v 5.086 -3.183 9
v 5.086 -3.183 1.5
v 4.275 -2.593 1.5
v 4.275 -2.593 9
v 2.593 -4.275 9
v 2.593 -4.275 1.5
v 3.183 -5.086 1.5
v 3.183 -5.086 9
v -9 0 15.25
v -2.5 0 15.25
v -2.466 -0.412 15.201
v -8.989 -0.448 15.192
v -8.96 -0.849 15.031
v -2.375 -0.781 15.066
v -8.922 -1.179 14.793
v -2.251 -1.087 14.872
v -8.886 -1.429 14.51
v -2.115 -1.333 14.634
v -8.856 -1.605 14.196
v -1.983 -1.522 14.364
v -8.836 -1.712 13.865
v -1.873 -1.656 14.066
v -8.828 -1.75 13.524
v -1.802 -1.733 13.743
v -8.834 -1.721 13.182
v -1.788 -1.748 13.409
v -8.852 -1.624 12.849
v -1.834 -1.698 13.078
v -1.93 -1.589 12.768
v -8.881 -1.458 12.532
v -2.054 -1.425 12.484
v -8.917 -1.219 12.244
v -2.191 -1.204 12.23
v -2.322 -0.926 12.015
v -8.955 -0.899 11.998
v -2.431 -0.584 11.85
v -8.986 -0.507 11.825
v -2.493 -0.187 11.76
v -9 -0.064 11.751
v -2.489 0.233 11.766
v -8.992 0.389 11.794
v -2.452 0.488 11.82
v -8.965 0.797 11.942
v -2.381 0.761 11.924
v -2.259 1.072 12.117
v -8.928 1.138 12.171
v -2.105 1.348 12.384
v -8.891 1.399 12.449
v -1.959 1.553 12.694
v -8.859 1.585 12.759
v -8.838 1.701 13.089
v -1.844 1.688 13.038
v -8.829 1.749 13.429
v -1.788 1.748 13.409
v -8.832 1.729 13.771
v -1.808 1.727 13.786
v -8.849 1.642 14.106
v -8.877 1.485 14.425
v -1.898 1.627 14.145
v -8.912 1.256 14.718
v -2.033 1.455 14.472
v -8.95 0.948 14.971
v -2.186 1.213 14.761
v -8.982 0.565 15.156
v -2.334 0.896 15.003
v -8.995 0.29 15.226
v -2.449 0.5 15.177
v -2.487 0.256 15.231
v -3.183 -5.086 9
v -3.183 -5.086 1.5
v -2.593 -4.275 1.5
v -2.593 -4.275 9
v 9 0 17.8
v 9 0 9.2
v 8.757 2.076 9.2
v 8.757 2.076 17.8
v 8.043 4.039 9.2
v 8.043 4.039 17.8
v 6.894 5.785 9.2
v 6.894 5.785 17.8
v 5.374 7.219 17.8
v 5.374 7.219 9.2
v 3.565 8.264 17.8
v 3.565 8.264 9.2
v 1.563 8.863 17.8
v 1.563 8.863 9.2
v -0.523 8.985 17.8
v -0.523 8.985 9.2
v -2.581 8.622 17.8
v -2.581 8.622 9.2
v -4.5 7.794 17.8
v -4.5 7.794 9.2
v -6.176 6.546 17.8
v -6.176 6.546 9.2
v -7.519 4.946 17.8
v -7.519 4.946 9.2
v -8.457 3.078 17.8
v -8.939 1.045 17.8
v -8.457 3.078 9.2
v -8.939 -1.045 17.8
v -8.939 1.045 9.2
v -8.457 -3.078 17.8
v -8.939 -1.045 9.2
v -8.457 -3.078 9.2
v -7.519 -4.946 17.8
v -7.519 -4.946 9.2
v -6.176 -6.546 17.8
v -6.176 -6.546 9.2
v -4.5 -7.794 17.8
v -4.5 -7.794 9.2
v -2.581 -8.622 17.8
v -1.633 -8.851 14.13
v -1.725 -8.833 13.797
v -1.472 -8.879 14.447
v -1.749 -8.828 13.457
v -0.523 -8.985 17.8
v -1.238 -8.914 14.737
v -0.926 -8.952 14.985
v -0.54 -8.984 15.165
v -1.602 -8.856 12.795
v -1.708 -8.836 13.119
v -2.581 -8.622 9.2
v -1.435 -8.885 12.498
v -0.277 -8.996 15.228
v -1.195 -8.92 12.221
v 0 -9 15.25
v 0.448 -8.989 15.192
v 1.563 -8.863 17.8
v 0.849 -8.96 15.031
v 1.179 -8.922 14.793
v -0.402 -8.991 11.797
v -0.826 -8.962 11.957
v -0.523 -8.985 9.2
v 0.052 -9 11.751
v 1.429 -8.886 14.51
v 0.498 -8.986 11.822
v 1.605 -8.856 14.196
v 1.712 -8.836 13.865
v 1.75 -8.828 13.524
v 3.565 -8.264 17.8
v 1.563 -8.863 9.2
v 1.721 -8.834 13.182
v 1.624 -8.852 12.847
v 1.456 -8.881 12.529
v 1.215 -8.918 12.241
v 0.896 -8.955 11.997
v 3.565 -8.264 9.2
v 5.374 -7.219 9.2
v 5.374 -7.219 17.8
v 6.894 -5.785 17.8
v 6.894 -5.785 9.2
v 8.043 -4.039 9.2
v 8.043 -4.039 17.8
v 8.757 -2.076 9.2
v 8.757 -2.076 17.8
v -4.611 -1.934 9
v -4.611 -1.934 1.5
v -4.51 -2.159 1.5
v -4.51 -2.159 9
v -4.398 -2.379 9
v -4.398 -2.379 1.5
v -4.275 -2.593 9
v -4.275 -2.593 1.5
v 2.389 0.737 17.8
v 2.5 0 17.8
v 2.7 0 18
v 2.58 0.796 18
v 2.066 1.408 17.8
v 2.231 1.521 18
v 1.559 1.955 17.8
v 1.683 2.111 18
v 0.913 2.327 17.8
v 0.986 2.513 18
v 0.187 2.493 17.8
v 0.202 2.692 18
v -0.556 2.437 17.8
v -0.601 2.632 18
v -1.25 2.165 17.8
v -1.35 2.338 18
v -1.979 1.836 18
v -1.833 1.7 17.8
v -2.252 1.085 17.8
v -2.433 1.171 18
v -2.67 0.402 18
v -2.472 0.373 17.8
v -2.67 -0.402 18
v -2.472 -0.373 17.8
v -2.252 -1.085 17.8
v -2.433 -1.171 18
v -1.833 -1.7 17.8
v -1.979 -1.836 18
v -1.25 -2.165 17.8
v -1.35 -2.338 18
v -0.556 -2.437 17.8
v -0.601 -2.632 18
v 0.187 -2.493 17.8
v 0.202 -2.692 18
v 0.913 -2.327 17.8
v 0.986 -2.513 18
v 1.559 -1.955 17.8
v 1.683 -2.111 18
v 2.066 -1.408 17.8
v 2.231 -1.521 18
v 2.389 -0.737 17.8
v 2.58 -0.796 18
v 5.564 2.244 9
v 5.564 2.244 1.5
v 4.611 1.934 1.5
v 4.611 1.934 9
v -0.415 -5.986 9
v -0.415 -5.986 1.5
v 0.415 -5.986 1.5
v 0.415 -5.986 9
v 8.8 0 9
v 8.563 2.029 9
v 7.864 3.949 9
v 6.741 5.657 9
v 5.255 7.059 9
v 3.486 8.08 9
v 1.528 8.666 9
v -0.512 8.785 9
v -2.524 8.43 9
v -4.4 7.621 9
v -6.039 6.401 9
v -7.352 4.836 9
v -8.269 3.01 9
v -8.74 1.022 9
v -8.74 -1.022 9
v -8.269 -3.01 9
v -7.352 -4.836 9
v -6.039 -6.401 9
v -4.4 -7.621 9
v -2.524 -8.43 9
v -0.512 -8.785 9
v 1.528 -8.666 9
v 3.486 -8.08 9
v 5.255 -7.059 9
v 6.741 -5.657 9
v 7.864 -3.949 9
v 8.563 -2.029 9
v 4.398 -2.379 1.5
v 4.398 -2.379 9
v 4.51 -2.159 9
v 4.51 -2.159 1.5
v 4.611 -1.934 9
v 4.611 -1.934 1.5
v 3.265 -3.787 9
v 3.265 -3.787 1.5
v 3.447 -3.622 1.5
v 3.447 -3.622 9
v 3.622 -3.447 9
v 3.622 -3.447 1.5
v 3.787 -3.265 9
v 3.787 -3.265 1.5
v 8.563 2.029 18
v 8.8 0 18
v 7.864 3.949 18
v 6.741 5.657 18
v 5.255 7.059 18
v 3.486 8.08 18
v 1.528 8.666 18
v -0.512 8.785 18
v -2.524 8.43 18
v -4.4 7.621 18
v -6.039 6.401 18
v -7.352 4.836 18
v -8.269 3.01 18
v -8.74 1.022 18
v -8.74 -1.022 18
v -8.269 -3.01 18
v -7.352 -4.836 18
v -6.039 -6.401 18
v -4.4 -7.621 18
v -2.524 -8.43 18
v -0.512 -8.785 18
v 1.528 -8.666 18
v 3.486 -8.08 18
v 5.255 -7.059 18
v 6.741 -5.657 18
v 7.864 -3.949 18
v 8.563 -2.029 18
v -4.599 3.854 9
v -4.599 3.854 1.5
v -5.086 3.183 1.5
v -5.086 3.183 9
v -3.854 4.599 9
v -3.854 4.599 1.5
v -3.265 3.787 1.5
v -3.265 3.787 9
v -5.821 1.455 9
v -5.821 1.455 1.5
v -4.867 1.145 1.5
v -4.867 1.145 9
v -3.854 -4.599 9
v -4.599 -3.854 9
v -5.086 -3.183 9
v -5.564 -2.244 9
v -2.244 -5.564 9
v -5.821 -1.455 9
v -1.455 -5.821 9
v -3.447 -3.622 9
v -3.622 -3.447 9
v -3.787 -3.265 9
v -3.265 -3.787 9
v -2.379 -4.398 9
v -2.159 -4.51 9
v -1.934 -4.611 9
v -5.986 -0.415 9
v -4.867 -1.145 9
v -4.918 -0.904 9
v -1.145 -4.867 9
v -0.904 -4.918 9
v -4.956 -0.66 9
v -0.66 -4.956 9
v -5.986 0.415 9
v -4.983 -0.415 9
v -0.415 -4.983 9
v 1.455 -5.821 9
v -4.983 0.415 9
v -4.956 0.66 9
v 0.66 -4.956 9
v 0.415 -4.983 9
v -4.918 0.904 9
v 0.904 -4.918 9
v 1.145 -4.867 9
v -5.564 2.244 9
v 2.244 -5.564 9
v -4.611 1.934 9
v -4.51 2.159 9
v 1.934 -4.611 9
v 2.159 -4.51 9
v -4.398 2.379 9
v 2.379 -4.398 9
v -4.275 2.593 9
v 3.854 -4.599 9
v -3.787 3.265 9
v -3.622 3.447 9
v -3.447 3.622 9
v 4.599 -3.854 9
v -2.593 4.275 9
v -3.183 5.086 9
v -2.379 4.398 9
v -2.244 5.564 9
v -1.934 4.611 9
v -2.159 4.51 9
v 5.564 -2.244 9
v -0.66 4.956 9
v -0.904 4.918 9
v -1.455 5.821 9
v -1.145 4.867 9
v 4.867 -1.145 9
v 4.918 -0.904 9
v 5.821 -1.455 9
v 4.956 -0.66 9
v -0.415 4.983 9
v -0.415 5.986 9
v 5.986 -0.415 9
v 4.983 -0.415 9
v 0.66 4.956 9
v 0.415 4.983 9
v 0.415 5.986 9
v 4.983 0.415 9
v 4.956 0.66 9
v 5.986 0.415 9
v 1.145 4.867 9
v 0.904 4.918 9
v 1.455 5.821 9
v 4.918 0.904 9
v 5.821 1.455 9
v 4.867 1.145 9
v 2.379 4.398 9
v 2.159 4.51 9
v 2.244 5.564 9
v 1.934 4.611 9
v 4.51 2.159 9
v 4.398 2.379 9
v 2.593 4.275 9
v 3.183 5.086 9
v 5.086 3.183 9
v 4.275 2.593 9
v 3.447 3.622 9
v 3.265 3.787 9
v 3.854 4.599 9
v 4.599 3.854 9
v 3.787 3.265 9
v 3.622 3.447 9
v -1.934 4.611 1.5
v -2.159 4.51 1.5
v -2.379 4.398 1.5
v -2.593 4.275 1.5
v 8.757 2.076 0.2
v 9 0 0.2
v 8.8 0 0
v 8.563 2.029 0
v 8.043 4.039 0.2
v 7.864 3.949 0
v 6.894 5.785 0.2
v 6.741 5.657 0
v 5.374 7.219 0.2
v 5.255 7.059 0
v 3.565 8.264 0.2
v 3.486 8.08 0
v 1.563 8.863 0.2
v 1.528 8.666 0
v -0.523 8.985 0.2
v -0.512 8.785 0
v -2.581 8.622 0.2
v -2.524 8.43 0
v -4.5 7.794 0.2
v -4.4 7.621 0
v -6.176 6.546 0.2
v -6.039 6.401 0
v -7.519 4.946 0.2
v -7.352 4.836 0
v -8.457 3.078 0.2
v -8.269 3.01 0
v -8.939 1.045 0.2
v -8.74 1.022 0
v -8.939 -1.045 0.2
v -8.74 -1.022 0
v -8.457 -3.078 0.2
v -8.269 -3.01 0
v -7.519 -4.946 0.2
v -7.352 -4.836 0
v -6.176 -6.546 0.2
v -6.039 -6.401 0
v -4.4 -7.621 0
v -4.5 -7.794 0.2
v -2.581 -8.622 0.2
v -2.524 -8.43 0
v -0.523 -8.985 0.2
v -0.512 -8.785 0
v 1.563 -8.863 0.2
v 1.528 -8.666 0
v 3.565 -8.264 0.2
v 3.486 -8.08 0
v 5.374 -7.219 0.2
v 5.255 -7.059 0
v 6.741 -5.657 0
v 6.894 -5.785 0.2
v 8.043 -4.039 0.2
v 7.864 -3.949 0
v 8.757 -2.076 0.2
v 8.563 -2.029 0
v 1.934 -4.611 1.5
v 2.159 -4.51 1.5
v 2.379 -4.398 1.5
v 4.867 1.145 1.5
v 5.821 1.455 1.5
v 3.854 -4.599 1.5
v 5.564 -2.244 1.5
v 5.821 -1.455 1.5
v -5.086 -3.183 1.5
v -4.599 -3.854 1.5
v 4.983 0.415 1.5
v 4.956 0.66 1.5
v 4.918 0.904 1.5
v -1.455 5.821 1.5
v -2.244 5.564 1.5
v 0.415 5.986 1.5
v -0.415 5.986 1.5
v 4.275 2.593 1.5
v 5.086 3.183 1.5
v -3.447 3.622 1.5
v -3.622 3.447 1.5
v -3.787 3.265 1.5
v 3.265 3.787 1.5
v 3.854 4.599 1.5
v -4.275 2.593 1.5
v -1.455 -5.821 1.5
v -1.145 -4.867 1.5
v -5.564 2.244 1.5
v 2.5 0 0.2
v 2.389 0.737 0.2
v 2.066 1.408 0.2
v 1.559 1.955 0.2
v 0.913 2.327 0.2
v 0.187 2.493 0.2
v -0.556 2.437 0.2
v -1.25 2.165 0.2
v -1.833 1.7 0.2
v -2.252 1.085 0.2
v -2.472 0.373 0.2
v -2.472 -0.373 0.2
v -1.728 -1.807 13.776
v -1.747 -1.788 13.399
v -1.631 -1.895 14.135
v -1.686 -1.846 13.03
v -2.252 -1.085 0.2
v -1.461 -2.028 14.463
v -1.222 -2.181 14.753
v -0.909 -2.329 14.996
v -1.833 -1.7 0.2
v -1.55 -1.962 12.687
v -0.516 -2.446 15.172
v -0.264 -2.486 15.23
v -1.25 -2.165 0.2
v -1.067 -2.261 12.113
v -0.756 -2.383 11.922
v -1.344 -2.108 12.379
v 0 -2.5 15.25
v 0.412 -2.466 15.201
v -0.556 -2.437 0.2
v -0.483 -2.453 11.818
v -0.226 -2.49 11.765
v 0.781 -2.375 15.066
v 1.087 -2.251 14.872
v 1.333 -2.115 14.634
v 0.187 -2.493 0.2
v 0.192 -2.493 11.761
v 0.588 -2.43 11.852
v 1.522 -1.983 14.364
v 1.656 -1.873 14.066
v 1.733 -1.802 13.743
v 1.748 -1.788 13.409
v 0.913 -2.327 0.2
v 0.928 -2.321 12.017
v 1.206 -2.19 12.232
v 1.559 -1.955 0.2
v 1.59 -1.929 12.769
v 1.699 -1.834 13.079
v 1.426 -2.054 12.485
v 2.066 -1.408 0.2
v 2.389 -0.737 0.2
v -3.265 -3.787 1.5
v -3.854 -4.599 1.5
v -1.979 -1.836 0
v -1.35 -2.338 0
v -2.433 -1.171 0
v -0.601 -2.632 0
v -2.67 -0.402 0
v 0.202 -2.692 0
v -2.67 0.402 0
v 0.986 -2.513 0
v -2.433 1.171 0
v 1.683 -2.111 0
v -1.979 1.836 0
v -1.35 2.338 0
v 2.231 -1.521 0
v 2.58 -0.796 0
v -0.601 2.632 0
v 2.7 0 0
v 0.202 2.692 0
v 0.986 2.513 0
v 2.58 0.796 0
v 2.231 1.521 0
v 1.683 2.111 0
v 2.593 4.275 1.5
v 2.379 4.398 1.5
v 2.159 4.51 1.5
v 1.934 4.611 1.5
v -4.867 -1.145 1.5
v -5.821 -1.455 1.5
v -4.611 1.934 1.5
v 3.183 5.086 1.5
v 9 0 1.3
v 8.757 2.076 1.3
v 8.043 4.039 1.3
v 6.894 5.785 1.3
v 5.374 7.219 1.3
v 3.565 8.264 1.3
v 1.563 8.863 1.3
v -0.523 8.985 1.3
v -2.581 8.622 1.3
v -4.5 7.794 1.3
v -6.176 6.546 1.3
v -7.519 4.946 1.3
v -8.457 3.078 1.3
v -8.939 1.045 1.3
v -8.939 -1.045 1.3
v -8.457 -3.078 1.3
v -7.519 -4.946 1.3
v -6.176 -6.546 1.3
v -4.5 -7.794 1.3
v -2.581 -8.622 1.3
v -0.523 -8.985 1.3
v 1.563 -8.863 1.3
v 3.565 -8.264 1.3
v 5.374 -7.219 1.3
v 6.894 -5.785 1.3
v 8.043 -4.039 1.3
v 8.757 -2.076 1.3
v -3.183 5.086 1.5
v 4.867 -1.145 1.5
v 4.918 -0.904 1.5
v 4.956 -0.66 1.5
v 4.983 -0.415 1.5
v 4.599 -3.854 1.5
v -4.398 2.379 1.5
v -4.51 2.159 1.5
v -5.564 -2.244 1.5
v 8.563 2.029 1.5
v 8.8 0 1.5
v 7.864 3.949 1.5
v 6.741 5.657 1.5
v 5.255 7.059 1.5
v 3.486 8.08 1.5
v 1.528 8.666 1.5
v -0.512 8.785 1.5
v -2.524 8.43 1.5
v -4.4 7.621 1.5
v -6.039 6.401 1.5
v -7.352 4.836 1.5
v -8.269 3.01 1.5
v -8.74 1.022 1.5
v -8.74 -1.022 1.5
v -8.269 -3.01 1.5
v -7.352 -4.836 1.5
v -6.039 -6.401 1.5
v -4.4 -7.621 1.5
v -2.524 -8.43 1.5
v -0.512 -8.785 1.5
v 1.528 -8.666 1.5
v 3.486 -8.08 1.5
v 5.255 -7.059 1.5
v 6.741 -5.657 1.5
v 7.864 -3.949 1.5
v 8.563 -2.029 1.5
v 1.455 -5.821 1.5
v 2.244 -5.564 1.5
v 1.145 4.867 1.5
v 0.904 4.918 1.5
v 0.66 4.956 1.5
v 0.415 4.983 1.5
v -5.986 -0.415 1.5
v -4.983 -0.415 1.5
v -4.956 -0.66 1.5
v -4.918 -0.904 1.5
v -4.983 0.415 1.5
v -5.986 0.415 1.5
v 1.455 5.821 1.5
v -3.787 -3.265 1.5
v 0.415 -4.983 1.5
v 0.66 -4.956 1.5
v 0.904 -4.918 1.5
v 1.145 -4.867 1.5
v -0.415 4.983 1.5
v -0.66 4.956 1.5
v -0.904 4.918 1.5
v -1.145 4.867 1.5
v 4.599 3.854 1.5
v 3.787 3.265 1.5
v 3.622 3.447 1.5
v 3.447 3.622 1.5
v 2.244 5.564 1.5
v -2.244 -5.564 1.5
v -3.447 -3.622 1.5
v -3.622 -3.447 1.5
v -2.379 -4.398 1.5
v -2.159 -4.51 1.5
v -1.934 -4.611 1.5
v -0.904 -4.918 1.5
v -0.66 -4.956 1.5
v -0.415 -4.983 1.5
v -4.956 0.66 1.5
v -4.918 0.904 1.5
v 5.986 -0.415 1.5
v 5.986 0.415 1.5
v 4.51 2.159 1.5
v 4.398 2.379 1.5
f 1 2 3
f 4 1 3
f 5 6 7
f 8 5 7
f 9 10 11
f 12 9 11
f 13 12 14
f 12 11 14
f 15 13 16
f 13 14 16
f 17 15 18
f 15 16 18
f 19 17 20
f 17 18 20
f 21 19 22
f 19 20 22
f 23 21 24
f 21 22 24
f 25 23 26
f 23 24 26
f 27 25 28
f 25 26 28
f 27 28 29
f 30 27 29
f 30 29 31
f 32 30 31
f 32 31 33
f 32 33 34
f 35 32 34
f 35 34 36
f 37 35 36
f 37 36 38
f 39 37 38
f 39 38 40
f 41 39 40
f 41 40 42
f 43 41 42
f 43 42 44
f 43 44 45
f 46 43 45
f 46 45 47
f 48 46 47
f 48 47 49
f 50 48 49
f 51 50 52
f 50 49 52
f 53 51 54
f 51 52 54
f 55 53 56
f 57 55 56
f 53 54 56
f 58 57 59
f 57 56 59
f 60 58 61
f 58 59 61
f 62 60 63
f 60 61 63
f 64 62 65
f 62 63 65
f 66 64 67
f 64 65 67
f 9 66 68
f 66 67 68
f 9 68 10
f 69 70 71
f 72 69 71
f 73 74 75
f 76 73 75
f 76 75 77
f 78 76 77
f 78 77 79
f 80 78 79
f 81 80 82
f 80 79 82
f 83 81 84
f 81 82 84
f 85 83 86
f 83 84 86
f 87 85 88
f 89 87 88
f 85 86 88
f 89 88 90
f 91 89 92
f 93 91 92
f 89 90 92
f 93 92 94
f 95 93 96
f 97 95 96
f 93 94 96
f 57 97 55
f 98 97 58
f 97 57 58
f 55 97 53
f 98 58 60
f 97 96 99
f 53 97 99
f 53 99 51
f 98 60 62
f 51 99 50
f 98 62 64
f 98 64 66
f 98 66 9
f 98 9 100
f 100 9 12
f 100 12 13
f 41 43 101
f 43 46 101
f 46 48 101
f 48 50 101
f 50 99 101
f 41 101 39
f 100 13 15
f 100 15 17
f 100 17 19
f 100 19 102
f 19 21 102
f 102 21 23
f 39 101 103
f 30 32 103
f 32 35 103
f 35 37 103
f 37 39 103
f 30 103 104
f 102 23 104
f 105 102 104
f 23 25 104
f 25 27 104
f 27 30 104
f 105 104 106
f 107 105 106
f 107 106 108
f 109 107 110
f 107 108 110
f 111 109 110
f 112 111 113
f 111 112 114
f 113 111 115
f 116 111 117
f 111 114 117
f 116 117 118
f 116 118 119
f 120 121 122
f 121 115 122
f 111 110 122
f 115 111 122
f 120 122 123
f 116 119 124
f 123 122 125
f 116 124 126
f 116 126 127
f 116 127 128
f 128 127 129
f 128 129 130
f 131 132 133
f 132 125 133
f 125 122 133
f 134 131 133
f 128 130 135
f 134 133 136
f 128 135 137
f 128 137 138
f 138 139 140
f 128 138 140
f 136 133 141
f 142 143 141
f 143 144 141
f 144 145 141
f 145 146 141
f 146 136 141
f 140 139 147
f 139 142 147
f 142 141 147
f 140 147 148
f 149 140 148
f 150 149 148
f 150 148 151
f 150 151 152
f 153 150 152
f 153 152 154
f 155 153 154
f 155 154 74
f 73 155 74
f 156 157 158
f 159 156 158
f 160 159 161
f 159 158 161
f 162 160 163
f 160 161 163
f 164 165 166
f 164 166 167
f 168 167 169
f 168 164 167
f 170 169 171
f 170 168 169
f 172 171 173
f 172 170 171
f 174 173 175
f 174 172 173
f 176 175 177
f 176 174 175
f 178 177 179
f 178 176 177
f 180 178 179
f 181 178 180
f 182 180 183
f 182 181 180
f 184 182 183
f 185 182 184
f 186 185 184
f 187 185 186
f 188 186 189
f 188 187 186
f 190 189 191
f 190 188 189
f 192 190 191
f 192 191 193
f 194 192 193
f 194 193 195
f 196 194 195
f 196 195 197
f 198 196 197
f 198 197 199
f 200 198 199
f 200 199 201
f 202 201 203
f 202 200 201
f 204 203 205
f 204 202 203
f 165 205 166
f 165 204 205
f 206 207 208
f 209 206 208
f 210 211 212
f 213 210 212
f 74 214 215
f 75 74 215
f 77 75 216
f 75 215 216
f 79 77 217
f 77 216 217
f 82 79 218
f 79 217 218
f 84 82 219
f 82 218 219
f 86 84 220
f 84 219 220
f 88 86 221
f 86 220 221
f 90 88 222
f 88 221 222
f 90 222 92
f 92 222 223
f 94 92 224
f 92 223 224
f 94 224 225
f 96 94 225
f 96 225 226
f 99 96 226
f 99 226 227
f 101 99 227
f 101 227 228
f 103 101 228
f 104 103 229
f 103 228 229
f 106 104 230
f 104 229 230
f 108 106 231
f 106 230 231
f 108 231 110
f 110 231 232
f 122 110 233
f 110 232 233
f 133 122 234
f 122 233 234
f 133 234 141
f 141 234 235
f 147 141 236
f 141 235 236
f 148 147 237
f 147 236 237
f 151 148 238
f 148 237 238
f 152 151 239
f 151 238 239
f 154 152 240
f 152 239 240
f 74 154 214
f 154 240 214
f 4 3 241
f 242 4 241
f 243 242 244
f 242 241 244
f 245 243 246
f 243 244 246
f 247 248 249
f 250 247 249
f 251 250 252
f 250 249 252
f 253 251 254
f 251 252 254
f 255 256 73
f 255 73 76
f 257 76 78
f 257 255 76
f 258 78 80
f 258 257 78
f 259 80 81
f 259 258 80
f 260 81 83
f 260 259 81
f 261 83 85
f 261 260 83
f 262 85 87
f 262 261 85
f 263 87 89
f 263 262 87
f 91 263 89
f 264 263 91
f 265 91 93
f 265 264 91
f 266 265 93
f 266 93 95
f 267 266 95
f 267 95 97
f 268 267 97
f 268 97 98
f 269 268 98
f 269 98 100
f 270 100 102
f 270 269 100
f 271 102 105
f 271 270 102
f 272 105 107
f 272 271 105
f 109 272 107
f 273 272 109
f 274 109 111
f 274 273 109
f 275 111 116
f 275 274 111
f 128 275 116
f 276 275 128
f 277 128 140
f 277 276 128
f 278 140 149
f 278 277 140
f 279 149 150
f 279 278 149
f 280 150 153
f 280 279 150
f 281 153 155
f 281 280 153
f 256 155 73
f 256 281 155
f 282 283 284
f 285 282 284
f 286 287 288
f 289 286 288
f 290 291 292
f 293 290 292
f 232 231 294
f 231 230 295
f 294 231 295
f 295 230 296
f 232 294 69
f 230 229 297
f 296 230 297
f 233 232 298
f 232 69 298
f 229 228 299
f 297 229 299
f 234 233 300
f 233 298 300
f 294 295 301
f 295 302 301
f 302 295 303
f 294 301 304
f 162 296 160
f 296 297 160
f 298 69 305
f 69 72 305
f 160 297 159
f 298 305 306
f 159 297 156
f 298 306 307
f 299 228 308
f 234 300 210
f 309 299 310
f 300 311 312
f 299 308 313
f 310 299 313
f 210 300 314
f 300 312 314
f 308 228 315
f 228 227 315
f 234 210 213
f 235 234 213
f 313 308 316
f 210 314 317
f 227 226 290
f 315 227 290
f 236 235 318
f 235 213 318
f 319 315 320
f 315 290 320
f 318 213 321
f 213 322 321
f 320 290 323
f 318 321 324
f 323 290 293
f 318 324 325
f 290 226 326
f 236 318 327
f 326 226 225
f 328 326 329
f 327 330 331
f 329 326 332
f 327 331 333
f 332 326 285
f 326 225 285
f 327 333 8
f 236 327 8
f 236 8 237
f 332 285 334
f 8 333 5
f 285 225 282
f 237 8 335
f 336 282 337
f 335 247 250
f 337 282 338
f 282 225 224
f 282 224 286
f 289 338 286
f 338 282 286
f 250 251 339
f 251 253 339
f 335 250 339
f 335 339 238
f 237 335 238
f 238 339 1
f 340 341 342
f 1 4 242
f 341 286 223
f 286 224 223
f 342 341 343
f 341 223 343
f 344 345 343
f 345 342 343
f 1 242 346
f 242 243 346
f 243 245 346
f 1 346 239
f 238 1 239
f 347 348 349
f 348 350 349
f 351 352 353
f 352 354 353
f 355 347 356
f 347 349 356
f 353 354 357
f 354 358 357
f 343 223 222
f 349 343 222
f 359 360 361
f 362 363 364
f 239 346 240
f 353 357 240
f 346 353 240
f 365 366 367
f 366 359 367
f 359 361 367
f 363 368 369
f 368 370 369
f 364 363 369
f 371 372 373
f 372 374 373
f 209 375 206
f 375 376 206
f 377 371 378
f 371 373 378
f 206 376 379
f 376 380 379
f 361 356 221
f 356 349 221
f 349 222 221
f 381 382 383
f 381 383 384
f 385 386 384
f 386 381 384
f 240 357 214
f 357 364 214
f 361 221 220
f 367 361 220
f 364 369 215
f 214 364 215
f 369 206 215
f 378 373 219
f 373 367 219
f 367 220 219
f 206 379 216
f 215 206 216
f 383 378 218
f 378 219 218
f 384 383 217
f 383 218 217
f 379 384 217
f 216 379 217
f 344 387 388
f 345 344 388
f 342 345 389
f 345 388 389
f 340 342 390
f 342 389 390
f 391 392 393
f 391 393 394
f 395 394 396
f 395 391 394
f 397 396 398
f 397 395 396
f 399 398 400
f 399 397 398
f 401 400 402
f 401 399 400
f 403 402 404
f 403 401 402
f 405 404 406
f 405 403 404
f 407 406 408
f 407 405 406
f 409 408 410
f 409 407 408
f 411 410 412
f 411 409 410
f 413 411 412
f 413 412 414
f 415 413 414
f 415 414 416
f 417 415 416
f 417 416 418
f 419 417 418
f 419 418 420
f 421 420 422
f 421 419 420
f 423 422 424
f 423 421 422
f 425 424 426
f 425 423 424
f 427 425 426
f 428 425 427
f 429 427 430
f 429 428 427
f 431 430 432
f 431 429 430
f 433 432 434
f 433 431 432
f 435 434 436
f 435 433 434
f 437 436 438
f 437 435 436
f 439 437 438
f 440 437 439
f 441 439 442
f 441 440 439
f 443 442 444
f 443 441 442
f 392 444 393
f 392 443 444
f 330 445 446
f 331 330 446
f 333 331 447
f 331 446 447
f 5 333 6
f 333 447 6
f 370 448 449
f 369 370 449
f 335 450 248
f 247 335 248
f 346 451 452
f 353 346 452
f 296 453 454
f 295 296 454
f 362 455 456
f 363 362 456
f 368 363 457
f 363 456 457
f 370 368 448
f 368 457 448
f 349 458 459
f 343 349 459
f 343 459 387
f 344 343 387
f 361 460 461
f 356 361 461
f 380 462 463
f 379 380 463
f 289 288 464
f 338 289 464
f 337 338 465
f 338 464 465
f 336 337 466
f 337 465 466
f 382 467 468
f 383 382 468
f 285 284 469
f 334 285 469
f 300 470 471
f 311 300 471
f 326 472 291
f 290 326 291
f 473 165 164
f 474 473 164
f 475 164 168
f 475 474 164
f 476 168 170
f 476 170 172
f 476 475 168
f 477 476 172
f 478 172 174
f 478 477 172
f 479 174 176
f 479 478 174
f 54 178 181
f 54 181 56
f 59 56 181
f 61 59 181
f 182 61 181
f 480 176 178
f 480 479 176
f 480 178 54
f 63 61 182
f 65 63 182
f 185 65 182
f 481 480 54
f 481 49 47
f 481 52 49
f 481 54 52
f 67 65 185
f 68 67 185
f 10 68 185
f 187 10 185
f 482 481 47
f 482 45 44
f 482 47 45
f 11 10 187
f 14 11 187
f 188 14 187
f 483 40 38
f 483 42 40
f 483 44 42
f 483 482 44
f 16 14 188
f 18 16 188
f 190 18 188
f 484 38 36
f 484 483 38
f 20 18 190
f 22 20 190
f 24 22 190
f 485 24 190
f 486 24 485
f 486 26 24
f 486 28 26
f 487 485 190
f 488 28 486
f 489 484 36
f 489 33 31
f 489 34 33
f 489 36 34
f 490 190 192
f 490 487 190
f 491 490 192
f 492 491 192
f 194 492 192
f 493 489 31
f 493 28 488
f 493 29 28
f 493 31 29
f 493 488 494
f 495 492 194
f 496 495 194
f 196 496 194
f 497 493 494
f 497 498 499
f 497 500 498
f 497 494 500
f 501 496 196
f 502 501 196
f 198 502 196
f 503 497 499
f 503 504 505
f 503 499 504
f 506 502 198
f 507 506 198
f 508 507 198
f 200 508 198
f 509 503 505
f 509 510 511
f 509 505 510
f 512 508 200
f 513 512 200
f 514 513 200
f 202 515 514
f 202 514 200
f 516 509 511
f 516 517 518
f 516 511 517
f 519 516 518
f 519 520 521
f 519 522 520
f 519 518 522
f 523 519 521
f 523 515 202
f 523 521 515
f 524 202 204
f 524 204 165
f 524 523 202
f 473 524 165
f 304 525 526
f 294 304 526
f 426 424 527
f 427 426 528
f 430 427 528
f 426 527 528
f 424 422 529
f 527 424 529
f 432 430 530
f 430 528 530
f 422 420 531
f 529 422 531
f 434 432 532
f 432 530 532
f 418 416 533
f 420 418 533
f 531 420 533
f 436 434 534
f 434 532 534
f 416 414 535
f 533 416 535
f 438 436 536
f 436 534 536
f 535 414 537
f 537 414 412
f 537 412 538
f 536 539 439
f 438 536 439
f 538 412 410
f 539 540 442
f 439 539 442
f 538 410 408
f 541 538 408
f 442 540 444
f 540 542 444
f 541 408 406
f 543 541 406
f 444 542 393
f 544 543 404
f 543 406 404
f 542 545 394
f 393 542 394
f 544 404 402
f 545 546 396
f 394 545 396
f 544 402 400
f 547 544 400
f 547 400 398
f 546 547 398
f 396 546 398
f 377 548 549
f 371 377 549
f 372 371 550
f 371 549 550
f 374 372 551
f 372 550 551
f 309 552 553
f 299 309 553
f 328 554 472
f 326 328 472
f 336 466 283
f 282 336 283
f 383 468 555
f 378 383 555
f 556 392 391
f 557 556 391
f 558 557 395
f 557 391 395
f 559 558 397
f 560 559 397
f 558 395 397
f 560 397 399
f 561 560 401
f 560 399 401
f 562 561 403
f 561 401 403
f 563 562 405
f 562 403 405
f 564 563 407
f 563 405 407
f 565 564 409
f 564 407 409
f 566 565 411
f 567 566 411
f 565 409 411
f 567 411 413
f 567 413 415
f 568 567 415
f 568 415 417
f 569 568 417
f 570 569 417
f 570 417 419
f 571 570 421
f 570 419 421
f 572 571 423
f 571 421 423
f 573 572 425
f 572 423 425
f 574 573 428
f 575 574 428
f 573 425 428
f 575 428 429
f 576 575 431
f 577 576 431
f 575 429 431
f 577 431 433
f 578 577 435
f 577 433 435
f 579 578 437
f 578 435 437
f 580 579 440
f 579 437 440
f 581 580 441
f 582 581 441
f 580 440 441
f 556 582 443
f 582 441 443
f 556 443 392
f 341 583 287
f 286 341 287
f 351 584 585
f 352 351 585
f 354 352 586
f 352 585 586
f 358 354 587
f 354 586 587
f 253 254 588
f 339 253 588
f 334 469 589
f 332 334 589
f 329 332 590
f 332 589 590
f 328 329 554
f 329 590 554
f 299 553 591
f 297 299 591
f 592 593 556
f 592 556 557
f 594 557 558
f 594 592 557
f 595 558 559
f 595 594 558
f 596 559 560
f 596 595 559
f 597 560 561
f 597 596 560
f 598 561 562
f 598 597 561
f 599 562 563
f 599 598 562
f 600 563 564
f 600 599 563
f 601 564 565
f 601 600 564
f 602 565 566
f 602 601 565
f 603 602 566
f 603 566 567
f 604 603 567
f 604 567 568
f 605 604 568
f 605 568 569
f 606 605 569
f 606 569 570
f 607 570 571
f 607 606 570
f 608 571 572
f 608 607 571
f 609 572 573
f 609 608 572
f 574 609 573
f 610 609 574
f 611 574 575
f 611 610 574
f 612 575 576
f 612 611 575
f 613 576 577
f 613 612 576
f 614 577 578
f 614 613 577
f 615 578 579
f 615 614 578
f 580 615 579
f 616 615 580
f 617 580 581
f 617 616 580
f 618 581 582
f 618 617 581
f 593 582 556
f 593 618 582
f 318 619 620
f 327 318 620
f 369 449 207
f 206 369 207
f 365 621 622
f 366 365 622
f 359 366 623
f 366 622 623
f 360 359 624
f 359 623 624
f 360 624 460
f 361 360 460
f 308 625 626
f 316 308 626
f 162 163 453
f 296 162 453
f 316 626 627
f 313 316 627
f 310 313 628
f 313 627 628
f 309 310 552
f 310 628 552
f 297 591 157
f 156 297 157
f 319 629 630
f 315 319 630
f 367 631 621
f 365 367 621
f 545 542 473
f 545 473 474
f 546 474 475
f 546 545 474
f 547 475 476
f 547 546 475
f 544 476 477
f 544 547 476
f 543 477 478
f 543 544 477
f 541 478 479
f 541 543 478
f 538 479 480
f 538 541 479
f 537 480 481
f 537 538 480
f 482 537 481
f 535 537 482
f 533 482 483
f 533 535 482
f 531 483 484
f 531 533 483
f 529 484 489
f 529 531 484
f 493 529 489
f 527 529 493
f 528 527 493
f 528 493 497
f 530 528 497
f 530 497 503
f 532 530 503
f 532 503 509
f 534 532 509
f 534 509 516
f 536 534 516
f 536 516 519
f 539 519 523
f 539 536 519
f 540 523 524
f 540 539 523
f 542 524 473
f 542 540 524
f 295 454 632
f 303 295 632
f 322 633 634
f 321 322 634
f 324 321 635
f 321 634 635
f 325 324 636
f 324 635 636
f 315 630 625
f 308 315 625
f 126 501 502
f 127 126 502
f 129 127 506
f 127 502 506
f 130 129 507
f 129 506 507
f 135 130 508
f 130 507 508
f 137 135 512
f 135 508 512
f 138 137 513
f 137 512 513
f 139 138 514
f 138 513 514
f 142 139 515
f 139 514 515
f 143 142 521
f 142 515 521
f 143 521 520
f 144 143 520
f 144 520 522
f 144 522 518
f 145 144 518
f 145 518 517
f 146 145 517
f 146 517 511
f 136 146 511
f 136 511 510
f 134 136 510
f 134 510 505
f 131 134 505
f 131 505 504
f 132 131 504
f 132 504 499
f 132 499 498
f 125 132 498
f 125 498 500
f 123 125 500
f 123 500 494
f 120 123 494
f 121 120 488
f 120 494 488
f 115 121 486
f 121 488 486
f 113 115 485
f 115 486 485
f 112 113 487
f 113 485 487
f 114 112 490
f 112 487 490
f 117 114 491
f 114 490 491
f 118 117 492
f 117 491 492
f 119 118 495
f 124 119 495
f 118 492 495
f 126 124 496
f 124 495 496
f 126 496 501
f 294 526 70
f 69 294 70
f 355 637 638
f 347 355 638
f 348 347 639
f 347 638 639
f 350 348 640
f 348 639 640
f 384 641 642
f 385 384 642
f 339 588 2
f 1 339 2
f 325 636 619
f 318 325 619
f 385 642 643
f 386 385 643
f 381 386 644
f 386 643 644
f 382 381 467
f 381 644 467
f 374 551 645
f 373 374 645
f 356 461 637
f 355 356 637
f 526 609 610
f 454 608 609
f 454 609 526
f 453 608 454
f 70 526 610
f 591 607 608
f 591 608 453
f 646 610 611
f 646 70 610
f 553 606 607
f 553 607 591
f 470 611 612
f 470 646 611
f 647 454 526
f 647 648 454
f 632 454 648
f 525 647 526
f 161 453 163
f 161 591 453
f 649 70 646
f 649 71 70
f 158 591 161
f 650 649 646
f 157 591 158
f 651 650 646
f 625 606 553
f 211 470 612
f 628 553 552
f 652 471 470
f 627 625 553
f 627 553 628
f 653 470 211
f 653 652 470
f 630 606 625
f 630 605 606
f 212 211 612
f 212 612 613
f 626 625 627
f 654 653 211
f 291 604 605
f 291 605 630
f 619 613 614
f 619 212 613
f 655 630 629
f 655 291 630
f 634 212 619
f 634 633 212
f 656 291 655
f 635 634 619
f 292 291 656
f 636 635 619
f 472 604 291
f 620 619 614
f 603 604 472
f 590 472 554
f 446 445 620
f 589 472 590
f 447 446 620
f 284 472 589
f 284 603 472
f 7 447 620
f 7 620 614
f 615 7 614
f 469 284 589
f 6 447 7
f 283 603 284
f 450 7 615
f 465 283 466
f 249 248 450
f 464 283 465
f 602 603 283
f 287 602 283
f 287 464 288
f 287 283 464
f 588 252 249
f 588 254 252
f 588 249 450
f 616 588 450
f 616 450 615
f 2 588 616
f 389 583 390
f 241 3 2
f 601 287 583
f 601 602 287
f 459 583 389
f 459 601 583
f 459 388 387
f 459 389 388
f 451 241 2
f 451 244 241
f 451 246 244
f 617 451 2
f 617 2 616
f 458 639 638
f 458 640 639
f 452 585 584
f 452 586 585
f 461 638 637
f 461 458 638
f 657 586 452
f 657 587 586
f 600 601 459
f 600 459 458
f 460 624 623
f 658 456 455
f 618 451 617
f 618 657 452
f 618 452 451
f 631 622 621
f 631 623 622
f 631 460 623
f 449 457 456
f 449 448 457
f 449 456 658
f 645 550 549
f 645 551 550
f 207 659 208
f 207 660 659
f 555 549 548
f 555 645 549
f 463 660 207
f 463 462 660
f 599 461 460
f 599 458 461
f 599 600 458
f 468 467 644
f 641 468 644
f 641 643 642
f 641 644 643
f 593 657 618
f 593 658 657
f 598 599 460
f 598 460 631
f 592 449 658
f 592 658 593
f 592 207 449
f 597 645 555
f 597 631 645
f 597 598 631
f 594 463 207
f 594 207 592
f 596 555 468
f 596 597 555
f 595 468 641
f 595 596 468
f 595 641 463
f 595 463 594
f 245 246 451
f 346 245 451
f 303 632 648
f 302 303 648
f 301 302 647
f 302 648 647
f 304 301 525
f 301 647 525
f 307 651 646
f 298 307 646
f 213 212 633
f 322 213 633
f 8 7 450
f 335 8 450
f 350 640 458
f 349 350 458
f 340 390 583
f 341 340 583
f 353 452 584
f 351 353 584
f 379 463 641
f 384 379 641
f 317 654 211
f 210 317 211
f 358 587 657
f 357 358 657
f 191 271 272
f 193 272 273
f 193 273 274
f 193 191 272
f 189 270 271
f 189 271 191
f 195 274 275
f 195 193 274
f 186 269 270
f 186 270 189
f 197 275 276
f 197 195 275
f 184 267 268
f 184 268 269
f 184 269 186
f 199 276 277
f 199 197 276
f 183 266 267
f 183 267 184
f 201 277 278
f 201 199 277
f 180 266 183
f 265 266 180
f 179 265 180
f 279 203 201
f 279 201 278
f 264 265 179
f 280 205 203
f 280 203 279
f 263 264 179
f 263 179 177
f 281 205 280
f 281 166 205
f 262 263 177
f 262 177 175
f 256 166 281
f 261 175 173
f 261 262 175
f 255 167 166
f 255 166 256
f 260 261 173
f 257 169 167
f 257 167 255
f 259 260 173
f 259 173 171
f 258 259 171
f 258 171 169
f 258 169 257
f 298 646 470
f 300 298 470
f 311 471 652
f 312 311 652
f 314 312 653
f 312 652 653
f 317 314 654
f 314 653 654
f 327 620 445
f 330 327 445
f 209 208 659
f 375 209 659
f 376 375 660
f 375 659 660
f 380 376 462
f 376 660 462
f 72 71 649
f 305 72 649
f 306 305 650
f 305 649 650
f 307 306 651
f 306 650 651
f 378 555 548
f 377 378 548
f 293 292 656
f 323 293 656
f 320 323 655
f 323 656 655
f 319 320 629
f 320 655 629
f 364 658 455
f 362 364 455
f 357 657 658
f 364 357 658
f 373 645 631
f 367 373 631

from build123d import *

# Parameters (mm, degrees)
SKETCH_1_R          = 9
SKETCH_1_R_2        = 2.5
EXTRUDE_1_DEPTH     = 1.5
SKETCH_2_R          = 2.5
EXTRUDE_2_DEPTH     = 7.5
SKETCH_3_R          = 9
SKETCH_3_R_2        = 2.5
EXTRUDE_3_DEPTH     = 9
CHAMFER_2_SIZE      = 0.2
SKETCH_4_R          = 1.75
CUT_EXTRUDE_1_DEPTH = 10
SKETCH_5_R          = 1.75
CUT_EXTRUDE_2_DEPTH = 10


with BuildPart() as part:
    # 草图1 → 凸台-拉伸1 (new body)
    with BuildSketch(Plane.XY):
        Circle(SKETCH_1_R)
        Circle(SKETCH_1_R_2, mode=Mode.SUBTRACT)
    extrude(amount=EXTRUDE_1_DEPTH)

    # 草图2 → 凸台-拉伸2 (add)
    with BuildSketch(Plane.XY.offset(1.5)):
        with BuildLine():
            Line((-0.415, 5.98563071), (-0.415, 4.982747736))
            ThreePointArc((-0.415, 4.982747736), (-0.782172325, 4.938441703), (-1.145065275, 4.867116756))
            Line((-1.145065275, 4.867116756), (-1.454973157, 5.820915144))
            Line((-1.454973157, 5.820915144), (-2.244350066, 5.564431038))
            Line((-2.244350066, 5.564431038), (-1.934442183, 4.610632651))
            ThreePointArc((-1.934442183, 4.610632651), (-2.269952499, 4.455032621), (-2.593043582, 4.275058477))
            Line((-2.593043582, 4.275058477), (-3.182523405, 5.086407846))
            Line((-3.182523405, 5.086407846), (-3.85400751, 4.598546087))
            Line((-3.85400751, 4.598546087), (-3.264527688, 3.787196717))
            ThreePointArc((-3.264527688, 3.787196717), (-3.535533906, 3.535533906), (-3.787196717, 3.264527688))
            Line((-3.787196717, 3.264527688), (-4.598546087, 3.85400751))
            Line((-4.598546087, 3.85400751), (-5.086407846, 3.182523405))
            Line((-5.086407846, 3.182523405), (-4.275058477, 2.593043582))
            ThreePointArc((-4.275058477, 2.593043582), (-4.455032621, 2.269952499), (-4.610632651, 1.934442183))
            Line((-4.610632651, 1.934442183), (-5.564431038, 2.244350066))
            Line((-5.564431038, 2.244350066), (-5.820915144, 1.454973157))
            Line((-5.820915144, 1.454973157), (-4.867116756, 1.145065275))
            ThreePointArc((-4.867116756, 1.145065275), (-4.938441703, 0.782172325), (-4.982747736, 0.415))
            Line((-4.982747736, 0.415), (-5.98563071, 0.415))
            Line((-5.98563071, 0.415), (-5.98563071, -0.415))
            Line((-5.98563071, -0.415), (-4.982747736, -0.415))
            ThreePointArc((-4.982747736, -0.415), (-4.938441703, -0.782172325), (-4.867116756, -1.145065275))
            Line((-4.867116756, -1.145065275), (-5.820915144, -1.454973157))
            Line((-5.820915144, -1.454973157), (-5.564431038, -2.244350066))
            Line((-5.564431038, -2.244350066), (-4.610632651, -1.934442183))
            ThreePointArc((-4.610632651, -1.934442183), (-4.455032621, -2.269952499), (-4.275058477, -2.593043582))
            Line((-4.275058477, -2.593043582), (-5.086407846, -3.182523405))
            Line((-5.086407846, -3.182523405), (-4.598546087, -3.85400751))
            Line((-4.598546087, -3.85400751), (-3.787196717, -3.264527688))
            ThreePointArc((-3.787196717, -3.264527688), (-3.535533906, -3.535533906), (-3.264527688, -3.787196717))
            Line((-3.264527688, -3.787196717), (-3.85400751, -4.598546087))
            Line((-3.85400751, -4.598546087), (-3.182523405, -5.086407846))
            Line((-3.182523405, -5.086407846), (-2.593043582, -4.275058477))
            ThreePointArc((-2.593043582, -4.275058477), (-2.269952499, -4.455032621), (-1.934442183, -4.610632651))
            Line((-1.934442183, -4.610632651), (-2.244350066, -5.564431038))
            Line((-2.244350066, -5.564431038), (-1.454973157, -5.820915144))
            Line((-1.454973157, -5.820915144), (-1.145065275, -4.867116756))
            ThreePointArc((-1.145065275, -4.867116756), (-0.782172325, -4.938441703), (-0.415, -4.982747736))
            Line((-0.415, -4.982747736), (-0.415, -5.98563071))
            Line((-0.415, -5.98563071), (0.415, -5.98563071))
            Line((0.415, -5.98563071), (0.415, -4.982747736))
            ThreePointArc((0.415, -4.982747736), (0.782172325, -4.938441703), (1.145065275, -4.867116756))
            Line((1.145065275, -4.867116756), (1.454973157, -5.820915144))
            Line((1.454973157, -5.820915144), (2.244350066, -5.564431038))
            Line((2.244350066, -5.564431038), (1.934442183, -4.610632651))
            ThreePointArc((1.934442183, -4.610632651), (2.269952499, -4.455032621), (2.593043582, -4.275058477))
            Line((2.593043582, -4.275058477), (3.182523405, -5.086407846))
            Line((3.182523405, -5.086407846), (3.85400751, -4.598546087))
            Line((3.85400751, -4.598546087), (3.264527688, -3.787196717))
            ThreePointArc((3.264527688, -3.787196717), (3.535533906, -3.535533906), (3.787196717, -3.264527688))
            Line((3.787196717, -3.264527688), (4.598546087, -3.85400751))
            Line((4.598546087, -3.85400751), (5.086407846, -3.182523405))
            Line((5.086407846, -3.182523405), (4.275058477, -2.593043582))
            ThreePointArc((4.275058477, -2.593043582), (4.455032621, -2.269952499), (4.610632651, -1.934442183))
            Line((4.610632651, -1.934442183), (5.564431038, -2.244350066))
            Line((5.564431038, -2.244350066), (5.820915144, -1.454973157))
            Line((5.820915144, -1.454973157), (4.867116756, -1.145065275))
            ThreePointArc((4.867116756, -1.145065275), (4.938441703, -0.782172325), (4.982747736, -0.415))
            Line((4.982747736, -0.415), (5.98563071, -0.415))
            Line((5.98563071, -0.415), (5.98563071, 0.415))
            Line((5.98563071, 0.415), (4.982747736, 0.415))
            ThreePointArc((4.982747736, 0.415), (4.938441703, 0.782172325), (4.867116756, 1.145065275))
            Line((4.867116756, 1.145065275), (5.820915144, 1.454973157))
            Line((5.820915144, 1.454973157), (5.564431038, 2.244350066))
            Line((5.564431038, 2.244350066), (4.610632651, 1.934442183))
            ThreePointArc((4.610632651, 1.934442183), (4.455032621, 2.269952499), (4.275058477, 2.593043582))
            Line((4.275058477, 2.593043582), (5.086407846, 3.182523405))
            Line((5.086407846, 3.182523405), (4.598546087, 3.85400751))
            Line((4.598546087, 3.85400751), (3.787196717, 3.264527688))
            ThreePointArc((3.787196717, 3.264527688), (3.535533906, 3.535533906), (3.264527688, 3.787196717))
            Line((3.264527688, 3.787196717), (3.85400751, 4.598546087))
            Line((3.85400751, 4.598546087), (3.182523405, 5.086407846))
            Line((3.182523405, 5.086407846), (2.593043582, 4.275058477))
            ThreePointArc((2.593043582, 4.275058477), (2.269952499, 4.455032621), (1.934442183, 4.610632651))
            Line((1.934442183, 4.610632651), (2.244350066, 5.564431038))
            Line((2.244350066, 5.564431038), (1.454973157, 5.820915144))
            Line((1.454973157, 5.820915144), (1.145065275, 4.867116756))
            ThreePointArc((1.145065275, 4.867116756), (0.782172325, 4.938441703), (0.415, 4.982747736))
            Line((0.415, 4.982747736), (0.415, 5.98563071))
            Line((0.415, 5.98563071), (-0.415, 5.98563071))
        make_face()
        Circle(SKETCH_2_R, mode=Mode.SUBTRACT)
    extrude(amount=EXTRUDE_2_DEPTH)

    # 草图3 → 凸台-拉伸3 (add)
    with BuildSketch(Plane.XY.offset(9)):
        Circle(SKETCH_3_R)
        Circle(SKETCH_3_R_2, mode=Mode.SUBTRACT)
    extrude(amount=EXTRUDE_3_DEPTH)

    # 倒角2
    chamfer_2_edges = [part.edges().sort_by_distance(p)[0] for p in [
        (-9, 0, 0),
        (-9, 0, 18),
        (-9, 0, 9),
        (-2.5, 0, 18),
        (-9, 0, 1.5),
        (-2.5, 0, 0),
    ]]
    chamfer(chamfer_2_edges, length=CHAMFER_2_SIZE)

    # 草图4 → 切除-拉伸1 (cut)
    with BuildSketch(Plane(origin=(0, 0, 0), x_dir=(1, 0, 0), z_dir=(0, 1, 0))):
        with Locations(Location((0, -13.5, 0), (0, 0, 270))):
            Circle(SKETCH_4_R)
    extrude(amount=-CUT_EXTRUDE_1_DEPTH, mode=Mode.SUBTRACT)

    # 草图5 → 切除-拉伸2 (cut)
    with BuildSketch(Plane(origin=(0, 0, 0), x_dir=(0, 0, -1), z_dir=(1, 0, 0))):
        with Locations(Location((-13.5, 0, 0), (0, 0, 180))):
            Circle(SKETCH_5_R)
    extrude(amount=-CUT_EXTRUDE_2_DEPTH, mode=Mode.SUBTRACT)


solid = part.part
